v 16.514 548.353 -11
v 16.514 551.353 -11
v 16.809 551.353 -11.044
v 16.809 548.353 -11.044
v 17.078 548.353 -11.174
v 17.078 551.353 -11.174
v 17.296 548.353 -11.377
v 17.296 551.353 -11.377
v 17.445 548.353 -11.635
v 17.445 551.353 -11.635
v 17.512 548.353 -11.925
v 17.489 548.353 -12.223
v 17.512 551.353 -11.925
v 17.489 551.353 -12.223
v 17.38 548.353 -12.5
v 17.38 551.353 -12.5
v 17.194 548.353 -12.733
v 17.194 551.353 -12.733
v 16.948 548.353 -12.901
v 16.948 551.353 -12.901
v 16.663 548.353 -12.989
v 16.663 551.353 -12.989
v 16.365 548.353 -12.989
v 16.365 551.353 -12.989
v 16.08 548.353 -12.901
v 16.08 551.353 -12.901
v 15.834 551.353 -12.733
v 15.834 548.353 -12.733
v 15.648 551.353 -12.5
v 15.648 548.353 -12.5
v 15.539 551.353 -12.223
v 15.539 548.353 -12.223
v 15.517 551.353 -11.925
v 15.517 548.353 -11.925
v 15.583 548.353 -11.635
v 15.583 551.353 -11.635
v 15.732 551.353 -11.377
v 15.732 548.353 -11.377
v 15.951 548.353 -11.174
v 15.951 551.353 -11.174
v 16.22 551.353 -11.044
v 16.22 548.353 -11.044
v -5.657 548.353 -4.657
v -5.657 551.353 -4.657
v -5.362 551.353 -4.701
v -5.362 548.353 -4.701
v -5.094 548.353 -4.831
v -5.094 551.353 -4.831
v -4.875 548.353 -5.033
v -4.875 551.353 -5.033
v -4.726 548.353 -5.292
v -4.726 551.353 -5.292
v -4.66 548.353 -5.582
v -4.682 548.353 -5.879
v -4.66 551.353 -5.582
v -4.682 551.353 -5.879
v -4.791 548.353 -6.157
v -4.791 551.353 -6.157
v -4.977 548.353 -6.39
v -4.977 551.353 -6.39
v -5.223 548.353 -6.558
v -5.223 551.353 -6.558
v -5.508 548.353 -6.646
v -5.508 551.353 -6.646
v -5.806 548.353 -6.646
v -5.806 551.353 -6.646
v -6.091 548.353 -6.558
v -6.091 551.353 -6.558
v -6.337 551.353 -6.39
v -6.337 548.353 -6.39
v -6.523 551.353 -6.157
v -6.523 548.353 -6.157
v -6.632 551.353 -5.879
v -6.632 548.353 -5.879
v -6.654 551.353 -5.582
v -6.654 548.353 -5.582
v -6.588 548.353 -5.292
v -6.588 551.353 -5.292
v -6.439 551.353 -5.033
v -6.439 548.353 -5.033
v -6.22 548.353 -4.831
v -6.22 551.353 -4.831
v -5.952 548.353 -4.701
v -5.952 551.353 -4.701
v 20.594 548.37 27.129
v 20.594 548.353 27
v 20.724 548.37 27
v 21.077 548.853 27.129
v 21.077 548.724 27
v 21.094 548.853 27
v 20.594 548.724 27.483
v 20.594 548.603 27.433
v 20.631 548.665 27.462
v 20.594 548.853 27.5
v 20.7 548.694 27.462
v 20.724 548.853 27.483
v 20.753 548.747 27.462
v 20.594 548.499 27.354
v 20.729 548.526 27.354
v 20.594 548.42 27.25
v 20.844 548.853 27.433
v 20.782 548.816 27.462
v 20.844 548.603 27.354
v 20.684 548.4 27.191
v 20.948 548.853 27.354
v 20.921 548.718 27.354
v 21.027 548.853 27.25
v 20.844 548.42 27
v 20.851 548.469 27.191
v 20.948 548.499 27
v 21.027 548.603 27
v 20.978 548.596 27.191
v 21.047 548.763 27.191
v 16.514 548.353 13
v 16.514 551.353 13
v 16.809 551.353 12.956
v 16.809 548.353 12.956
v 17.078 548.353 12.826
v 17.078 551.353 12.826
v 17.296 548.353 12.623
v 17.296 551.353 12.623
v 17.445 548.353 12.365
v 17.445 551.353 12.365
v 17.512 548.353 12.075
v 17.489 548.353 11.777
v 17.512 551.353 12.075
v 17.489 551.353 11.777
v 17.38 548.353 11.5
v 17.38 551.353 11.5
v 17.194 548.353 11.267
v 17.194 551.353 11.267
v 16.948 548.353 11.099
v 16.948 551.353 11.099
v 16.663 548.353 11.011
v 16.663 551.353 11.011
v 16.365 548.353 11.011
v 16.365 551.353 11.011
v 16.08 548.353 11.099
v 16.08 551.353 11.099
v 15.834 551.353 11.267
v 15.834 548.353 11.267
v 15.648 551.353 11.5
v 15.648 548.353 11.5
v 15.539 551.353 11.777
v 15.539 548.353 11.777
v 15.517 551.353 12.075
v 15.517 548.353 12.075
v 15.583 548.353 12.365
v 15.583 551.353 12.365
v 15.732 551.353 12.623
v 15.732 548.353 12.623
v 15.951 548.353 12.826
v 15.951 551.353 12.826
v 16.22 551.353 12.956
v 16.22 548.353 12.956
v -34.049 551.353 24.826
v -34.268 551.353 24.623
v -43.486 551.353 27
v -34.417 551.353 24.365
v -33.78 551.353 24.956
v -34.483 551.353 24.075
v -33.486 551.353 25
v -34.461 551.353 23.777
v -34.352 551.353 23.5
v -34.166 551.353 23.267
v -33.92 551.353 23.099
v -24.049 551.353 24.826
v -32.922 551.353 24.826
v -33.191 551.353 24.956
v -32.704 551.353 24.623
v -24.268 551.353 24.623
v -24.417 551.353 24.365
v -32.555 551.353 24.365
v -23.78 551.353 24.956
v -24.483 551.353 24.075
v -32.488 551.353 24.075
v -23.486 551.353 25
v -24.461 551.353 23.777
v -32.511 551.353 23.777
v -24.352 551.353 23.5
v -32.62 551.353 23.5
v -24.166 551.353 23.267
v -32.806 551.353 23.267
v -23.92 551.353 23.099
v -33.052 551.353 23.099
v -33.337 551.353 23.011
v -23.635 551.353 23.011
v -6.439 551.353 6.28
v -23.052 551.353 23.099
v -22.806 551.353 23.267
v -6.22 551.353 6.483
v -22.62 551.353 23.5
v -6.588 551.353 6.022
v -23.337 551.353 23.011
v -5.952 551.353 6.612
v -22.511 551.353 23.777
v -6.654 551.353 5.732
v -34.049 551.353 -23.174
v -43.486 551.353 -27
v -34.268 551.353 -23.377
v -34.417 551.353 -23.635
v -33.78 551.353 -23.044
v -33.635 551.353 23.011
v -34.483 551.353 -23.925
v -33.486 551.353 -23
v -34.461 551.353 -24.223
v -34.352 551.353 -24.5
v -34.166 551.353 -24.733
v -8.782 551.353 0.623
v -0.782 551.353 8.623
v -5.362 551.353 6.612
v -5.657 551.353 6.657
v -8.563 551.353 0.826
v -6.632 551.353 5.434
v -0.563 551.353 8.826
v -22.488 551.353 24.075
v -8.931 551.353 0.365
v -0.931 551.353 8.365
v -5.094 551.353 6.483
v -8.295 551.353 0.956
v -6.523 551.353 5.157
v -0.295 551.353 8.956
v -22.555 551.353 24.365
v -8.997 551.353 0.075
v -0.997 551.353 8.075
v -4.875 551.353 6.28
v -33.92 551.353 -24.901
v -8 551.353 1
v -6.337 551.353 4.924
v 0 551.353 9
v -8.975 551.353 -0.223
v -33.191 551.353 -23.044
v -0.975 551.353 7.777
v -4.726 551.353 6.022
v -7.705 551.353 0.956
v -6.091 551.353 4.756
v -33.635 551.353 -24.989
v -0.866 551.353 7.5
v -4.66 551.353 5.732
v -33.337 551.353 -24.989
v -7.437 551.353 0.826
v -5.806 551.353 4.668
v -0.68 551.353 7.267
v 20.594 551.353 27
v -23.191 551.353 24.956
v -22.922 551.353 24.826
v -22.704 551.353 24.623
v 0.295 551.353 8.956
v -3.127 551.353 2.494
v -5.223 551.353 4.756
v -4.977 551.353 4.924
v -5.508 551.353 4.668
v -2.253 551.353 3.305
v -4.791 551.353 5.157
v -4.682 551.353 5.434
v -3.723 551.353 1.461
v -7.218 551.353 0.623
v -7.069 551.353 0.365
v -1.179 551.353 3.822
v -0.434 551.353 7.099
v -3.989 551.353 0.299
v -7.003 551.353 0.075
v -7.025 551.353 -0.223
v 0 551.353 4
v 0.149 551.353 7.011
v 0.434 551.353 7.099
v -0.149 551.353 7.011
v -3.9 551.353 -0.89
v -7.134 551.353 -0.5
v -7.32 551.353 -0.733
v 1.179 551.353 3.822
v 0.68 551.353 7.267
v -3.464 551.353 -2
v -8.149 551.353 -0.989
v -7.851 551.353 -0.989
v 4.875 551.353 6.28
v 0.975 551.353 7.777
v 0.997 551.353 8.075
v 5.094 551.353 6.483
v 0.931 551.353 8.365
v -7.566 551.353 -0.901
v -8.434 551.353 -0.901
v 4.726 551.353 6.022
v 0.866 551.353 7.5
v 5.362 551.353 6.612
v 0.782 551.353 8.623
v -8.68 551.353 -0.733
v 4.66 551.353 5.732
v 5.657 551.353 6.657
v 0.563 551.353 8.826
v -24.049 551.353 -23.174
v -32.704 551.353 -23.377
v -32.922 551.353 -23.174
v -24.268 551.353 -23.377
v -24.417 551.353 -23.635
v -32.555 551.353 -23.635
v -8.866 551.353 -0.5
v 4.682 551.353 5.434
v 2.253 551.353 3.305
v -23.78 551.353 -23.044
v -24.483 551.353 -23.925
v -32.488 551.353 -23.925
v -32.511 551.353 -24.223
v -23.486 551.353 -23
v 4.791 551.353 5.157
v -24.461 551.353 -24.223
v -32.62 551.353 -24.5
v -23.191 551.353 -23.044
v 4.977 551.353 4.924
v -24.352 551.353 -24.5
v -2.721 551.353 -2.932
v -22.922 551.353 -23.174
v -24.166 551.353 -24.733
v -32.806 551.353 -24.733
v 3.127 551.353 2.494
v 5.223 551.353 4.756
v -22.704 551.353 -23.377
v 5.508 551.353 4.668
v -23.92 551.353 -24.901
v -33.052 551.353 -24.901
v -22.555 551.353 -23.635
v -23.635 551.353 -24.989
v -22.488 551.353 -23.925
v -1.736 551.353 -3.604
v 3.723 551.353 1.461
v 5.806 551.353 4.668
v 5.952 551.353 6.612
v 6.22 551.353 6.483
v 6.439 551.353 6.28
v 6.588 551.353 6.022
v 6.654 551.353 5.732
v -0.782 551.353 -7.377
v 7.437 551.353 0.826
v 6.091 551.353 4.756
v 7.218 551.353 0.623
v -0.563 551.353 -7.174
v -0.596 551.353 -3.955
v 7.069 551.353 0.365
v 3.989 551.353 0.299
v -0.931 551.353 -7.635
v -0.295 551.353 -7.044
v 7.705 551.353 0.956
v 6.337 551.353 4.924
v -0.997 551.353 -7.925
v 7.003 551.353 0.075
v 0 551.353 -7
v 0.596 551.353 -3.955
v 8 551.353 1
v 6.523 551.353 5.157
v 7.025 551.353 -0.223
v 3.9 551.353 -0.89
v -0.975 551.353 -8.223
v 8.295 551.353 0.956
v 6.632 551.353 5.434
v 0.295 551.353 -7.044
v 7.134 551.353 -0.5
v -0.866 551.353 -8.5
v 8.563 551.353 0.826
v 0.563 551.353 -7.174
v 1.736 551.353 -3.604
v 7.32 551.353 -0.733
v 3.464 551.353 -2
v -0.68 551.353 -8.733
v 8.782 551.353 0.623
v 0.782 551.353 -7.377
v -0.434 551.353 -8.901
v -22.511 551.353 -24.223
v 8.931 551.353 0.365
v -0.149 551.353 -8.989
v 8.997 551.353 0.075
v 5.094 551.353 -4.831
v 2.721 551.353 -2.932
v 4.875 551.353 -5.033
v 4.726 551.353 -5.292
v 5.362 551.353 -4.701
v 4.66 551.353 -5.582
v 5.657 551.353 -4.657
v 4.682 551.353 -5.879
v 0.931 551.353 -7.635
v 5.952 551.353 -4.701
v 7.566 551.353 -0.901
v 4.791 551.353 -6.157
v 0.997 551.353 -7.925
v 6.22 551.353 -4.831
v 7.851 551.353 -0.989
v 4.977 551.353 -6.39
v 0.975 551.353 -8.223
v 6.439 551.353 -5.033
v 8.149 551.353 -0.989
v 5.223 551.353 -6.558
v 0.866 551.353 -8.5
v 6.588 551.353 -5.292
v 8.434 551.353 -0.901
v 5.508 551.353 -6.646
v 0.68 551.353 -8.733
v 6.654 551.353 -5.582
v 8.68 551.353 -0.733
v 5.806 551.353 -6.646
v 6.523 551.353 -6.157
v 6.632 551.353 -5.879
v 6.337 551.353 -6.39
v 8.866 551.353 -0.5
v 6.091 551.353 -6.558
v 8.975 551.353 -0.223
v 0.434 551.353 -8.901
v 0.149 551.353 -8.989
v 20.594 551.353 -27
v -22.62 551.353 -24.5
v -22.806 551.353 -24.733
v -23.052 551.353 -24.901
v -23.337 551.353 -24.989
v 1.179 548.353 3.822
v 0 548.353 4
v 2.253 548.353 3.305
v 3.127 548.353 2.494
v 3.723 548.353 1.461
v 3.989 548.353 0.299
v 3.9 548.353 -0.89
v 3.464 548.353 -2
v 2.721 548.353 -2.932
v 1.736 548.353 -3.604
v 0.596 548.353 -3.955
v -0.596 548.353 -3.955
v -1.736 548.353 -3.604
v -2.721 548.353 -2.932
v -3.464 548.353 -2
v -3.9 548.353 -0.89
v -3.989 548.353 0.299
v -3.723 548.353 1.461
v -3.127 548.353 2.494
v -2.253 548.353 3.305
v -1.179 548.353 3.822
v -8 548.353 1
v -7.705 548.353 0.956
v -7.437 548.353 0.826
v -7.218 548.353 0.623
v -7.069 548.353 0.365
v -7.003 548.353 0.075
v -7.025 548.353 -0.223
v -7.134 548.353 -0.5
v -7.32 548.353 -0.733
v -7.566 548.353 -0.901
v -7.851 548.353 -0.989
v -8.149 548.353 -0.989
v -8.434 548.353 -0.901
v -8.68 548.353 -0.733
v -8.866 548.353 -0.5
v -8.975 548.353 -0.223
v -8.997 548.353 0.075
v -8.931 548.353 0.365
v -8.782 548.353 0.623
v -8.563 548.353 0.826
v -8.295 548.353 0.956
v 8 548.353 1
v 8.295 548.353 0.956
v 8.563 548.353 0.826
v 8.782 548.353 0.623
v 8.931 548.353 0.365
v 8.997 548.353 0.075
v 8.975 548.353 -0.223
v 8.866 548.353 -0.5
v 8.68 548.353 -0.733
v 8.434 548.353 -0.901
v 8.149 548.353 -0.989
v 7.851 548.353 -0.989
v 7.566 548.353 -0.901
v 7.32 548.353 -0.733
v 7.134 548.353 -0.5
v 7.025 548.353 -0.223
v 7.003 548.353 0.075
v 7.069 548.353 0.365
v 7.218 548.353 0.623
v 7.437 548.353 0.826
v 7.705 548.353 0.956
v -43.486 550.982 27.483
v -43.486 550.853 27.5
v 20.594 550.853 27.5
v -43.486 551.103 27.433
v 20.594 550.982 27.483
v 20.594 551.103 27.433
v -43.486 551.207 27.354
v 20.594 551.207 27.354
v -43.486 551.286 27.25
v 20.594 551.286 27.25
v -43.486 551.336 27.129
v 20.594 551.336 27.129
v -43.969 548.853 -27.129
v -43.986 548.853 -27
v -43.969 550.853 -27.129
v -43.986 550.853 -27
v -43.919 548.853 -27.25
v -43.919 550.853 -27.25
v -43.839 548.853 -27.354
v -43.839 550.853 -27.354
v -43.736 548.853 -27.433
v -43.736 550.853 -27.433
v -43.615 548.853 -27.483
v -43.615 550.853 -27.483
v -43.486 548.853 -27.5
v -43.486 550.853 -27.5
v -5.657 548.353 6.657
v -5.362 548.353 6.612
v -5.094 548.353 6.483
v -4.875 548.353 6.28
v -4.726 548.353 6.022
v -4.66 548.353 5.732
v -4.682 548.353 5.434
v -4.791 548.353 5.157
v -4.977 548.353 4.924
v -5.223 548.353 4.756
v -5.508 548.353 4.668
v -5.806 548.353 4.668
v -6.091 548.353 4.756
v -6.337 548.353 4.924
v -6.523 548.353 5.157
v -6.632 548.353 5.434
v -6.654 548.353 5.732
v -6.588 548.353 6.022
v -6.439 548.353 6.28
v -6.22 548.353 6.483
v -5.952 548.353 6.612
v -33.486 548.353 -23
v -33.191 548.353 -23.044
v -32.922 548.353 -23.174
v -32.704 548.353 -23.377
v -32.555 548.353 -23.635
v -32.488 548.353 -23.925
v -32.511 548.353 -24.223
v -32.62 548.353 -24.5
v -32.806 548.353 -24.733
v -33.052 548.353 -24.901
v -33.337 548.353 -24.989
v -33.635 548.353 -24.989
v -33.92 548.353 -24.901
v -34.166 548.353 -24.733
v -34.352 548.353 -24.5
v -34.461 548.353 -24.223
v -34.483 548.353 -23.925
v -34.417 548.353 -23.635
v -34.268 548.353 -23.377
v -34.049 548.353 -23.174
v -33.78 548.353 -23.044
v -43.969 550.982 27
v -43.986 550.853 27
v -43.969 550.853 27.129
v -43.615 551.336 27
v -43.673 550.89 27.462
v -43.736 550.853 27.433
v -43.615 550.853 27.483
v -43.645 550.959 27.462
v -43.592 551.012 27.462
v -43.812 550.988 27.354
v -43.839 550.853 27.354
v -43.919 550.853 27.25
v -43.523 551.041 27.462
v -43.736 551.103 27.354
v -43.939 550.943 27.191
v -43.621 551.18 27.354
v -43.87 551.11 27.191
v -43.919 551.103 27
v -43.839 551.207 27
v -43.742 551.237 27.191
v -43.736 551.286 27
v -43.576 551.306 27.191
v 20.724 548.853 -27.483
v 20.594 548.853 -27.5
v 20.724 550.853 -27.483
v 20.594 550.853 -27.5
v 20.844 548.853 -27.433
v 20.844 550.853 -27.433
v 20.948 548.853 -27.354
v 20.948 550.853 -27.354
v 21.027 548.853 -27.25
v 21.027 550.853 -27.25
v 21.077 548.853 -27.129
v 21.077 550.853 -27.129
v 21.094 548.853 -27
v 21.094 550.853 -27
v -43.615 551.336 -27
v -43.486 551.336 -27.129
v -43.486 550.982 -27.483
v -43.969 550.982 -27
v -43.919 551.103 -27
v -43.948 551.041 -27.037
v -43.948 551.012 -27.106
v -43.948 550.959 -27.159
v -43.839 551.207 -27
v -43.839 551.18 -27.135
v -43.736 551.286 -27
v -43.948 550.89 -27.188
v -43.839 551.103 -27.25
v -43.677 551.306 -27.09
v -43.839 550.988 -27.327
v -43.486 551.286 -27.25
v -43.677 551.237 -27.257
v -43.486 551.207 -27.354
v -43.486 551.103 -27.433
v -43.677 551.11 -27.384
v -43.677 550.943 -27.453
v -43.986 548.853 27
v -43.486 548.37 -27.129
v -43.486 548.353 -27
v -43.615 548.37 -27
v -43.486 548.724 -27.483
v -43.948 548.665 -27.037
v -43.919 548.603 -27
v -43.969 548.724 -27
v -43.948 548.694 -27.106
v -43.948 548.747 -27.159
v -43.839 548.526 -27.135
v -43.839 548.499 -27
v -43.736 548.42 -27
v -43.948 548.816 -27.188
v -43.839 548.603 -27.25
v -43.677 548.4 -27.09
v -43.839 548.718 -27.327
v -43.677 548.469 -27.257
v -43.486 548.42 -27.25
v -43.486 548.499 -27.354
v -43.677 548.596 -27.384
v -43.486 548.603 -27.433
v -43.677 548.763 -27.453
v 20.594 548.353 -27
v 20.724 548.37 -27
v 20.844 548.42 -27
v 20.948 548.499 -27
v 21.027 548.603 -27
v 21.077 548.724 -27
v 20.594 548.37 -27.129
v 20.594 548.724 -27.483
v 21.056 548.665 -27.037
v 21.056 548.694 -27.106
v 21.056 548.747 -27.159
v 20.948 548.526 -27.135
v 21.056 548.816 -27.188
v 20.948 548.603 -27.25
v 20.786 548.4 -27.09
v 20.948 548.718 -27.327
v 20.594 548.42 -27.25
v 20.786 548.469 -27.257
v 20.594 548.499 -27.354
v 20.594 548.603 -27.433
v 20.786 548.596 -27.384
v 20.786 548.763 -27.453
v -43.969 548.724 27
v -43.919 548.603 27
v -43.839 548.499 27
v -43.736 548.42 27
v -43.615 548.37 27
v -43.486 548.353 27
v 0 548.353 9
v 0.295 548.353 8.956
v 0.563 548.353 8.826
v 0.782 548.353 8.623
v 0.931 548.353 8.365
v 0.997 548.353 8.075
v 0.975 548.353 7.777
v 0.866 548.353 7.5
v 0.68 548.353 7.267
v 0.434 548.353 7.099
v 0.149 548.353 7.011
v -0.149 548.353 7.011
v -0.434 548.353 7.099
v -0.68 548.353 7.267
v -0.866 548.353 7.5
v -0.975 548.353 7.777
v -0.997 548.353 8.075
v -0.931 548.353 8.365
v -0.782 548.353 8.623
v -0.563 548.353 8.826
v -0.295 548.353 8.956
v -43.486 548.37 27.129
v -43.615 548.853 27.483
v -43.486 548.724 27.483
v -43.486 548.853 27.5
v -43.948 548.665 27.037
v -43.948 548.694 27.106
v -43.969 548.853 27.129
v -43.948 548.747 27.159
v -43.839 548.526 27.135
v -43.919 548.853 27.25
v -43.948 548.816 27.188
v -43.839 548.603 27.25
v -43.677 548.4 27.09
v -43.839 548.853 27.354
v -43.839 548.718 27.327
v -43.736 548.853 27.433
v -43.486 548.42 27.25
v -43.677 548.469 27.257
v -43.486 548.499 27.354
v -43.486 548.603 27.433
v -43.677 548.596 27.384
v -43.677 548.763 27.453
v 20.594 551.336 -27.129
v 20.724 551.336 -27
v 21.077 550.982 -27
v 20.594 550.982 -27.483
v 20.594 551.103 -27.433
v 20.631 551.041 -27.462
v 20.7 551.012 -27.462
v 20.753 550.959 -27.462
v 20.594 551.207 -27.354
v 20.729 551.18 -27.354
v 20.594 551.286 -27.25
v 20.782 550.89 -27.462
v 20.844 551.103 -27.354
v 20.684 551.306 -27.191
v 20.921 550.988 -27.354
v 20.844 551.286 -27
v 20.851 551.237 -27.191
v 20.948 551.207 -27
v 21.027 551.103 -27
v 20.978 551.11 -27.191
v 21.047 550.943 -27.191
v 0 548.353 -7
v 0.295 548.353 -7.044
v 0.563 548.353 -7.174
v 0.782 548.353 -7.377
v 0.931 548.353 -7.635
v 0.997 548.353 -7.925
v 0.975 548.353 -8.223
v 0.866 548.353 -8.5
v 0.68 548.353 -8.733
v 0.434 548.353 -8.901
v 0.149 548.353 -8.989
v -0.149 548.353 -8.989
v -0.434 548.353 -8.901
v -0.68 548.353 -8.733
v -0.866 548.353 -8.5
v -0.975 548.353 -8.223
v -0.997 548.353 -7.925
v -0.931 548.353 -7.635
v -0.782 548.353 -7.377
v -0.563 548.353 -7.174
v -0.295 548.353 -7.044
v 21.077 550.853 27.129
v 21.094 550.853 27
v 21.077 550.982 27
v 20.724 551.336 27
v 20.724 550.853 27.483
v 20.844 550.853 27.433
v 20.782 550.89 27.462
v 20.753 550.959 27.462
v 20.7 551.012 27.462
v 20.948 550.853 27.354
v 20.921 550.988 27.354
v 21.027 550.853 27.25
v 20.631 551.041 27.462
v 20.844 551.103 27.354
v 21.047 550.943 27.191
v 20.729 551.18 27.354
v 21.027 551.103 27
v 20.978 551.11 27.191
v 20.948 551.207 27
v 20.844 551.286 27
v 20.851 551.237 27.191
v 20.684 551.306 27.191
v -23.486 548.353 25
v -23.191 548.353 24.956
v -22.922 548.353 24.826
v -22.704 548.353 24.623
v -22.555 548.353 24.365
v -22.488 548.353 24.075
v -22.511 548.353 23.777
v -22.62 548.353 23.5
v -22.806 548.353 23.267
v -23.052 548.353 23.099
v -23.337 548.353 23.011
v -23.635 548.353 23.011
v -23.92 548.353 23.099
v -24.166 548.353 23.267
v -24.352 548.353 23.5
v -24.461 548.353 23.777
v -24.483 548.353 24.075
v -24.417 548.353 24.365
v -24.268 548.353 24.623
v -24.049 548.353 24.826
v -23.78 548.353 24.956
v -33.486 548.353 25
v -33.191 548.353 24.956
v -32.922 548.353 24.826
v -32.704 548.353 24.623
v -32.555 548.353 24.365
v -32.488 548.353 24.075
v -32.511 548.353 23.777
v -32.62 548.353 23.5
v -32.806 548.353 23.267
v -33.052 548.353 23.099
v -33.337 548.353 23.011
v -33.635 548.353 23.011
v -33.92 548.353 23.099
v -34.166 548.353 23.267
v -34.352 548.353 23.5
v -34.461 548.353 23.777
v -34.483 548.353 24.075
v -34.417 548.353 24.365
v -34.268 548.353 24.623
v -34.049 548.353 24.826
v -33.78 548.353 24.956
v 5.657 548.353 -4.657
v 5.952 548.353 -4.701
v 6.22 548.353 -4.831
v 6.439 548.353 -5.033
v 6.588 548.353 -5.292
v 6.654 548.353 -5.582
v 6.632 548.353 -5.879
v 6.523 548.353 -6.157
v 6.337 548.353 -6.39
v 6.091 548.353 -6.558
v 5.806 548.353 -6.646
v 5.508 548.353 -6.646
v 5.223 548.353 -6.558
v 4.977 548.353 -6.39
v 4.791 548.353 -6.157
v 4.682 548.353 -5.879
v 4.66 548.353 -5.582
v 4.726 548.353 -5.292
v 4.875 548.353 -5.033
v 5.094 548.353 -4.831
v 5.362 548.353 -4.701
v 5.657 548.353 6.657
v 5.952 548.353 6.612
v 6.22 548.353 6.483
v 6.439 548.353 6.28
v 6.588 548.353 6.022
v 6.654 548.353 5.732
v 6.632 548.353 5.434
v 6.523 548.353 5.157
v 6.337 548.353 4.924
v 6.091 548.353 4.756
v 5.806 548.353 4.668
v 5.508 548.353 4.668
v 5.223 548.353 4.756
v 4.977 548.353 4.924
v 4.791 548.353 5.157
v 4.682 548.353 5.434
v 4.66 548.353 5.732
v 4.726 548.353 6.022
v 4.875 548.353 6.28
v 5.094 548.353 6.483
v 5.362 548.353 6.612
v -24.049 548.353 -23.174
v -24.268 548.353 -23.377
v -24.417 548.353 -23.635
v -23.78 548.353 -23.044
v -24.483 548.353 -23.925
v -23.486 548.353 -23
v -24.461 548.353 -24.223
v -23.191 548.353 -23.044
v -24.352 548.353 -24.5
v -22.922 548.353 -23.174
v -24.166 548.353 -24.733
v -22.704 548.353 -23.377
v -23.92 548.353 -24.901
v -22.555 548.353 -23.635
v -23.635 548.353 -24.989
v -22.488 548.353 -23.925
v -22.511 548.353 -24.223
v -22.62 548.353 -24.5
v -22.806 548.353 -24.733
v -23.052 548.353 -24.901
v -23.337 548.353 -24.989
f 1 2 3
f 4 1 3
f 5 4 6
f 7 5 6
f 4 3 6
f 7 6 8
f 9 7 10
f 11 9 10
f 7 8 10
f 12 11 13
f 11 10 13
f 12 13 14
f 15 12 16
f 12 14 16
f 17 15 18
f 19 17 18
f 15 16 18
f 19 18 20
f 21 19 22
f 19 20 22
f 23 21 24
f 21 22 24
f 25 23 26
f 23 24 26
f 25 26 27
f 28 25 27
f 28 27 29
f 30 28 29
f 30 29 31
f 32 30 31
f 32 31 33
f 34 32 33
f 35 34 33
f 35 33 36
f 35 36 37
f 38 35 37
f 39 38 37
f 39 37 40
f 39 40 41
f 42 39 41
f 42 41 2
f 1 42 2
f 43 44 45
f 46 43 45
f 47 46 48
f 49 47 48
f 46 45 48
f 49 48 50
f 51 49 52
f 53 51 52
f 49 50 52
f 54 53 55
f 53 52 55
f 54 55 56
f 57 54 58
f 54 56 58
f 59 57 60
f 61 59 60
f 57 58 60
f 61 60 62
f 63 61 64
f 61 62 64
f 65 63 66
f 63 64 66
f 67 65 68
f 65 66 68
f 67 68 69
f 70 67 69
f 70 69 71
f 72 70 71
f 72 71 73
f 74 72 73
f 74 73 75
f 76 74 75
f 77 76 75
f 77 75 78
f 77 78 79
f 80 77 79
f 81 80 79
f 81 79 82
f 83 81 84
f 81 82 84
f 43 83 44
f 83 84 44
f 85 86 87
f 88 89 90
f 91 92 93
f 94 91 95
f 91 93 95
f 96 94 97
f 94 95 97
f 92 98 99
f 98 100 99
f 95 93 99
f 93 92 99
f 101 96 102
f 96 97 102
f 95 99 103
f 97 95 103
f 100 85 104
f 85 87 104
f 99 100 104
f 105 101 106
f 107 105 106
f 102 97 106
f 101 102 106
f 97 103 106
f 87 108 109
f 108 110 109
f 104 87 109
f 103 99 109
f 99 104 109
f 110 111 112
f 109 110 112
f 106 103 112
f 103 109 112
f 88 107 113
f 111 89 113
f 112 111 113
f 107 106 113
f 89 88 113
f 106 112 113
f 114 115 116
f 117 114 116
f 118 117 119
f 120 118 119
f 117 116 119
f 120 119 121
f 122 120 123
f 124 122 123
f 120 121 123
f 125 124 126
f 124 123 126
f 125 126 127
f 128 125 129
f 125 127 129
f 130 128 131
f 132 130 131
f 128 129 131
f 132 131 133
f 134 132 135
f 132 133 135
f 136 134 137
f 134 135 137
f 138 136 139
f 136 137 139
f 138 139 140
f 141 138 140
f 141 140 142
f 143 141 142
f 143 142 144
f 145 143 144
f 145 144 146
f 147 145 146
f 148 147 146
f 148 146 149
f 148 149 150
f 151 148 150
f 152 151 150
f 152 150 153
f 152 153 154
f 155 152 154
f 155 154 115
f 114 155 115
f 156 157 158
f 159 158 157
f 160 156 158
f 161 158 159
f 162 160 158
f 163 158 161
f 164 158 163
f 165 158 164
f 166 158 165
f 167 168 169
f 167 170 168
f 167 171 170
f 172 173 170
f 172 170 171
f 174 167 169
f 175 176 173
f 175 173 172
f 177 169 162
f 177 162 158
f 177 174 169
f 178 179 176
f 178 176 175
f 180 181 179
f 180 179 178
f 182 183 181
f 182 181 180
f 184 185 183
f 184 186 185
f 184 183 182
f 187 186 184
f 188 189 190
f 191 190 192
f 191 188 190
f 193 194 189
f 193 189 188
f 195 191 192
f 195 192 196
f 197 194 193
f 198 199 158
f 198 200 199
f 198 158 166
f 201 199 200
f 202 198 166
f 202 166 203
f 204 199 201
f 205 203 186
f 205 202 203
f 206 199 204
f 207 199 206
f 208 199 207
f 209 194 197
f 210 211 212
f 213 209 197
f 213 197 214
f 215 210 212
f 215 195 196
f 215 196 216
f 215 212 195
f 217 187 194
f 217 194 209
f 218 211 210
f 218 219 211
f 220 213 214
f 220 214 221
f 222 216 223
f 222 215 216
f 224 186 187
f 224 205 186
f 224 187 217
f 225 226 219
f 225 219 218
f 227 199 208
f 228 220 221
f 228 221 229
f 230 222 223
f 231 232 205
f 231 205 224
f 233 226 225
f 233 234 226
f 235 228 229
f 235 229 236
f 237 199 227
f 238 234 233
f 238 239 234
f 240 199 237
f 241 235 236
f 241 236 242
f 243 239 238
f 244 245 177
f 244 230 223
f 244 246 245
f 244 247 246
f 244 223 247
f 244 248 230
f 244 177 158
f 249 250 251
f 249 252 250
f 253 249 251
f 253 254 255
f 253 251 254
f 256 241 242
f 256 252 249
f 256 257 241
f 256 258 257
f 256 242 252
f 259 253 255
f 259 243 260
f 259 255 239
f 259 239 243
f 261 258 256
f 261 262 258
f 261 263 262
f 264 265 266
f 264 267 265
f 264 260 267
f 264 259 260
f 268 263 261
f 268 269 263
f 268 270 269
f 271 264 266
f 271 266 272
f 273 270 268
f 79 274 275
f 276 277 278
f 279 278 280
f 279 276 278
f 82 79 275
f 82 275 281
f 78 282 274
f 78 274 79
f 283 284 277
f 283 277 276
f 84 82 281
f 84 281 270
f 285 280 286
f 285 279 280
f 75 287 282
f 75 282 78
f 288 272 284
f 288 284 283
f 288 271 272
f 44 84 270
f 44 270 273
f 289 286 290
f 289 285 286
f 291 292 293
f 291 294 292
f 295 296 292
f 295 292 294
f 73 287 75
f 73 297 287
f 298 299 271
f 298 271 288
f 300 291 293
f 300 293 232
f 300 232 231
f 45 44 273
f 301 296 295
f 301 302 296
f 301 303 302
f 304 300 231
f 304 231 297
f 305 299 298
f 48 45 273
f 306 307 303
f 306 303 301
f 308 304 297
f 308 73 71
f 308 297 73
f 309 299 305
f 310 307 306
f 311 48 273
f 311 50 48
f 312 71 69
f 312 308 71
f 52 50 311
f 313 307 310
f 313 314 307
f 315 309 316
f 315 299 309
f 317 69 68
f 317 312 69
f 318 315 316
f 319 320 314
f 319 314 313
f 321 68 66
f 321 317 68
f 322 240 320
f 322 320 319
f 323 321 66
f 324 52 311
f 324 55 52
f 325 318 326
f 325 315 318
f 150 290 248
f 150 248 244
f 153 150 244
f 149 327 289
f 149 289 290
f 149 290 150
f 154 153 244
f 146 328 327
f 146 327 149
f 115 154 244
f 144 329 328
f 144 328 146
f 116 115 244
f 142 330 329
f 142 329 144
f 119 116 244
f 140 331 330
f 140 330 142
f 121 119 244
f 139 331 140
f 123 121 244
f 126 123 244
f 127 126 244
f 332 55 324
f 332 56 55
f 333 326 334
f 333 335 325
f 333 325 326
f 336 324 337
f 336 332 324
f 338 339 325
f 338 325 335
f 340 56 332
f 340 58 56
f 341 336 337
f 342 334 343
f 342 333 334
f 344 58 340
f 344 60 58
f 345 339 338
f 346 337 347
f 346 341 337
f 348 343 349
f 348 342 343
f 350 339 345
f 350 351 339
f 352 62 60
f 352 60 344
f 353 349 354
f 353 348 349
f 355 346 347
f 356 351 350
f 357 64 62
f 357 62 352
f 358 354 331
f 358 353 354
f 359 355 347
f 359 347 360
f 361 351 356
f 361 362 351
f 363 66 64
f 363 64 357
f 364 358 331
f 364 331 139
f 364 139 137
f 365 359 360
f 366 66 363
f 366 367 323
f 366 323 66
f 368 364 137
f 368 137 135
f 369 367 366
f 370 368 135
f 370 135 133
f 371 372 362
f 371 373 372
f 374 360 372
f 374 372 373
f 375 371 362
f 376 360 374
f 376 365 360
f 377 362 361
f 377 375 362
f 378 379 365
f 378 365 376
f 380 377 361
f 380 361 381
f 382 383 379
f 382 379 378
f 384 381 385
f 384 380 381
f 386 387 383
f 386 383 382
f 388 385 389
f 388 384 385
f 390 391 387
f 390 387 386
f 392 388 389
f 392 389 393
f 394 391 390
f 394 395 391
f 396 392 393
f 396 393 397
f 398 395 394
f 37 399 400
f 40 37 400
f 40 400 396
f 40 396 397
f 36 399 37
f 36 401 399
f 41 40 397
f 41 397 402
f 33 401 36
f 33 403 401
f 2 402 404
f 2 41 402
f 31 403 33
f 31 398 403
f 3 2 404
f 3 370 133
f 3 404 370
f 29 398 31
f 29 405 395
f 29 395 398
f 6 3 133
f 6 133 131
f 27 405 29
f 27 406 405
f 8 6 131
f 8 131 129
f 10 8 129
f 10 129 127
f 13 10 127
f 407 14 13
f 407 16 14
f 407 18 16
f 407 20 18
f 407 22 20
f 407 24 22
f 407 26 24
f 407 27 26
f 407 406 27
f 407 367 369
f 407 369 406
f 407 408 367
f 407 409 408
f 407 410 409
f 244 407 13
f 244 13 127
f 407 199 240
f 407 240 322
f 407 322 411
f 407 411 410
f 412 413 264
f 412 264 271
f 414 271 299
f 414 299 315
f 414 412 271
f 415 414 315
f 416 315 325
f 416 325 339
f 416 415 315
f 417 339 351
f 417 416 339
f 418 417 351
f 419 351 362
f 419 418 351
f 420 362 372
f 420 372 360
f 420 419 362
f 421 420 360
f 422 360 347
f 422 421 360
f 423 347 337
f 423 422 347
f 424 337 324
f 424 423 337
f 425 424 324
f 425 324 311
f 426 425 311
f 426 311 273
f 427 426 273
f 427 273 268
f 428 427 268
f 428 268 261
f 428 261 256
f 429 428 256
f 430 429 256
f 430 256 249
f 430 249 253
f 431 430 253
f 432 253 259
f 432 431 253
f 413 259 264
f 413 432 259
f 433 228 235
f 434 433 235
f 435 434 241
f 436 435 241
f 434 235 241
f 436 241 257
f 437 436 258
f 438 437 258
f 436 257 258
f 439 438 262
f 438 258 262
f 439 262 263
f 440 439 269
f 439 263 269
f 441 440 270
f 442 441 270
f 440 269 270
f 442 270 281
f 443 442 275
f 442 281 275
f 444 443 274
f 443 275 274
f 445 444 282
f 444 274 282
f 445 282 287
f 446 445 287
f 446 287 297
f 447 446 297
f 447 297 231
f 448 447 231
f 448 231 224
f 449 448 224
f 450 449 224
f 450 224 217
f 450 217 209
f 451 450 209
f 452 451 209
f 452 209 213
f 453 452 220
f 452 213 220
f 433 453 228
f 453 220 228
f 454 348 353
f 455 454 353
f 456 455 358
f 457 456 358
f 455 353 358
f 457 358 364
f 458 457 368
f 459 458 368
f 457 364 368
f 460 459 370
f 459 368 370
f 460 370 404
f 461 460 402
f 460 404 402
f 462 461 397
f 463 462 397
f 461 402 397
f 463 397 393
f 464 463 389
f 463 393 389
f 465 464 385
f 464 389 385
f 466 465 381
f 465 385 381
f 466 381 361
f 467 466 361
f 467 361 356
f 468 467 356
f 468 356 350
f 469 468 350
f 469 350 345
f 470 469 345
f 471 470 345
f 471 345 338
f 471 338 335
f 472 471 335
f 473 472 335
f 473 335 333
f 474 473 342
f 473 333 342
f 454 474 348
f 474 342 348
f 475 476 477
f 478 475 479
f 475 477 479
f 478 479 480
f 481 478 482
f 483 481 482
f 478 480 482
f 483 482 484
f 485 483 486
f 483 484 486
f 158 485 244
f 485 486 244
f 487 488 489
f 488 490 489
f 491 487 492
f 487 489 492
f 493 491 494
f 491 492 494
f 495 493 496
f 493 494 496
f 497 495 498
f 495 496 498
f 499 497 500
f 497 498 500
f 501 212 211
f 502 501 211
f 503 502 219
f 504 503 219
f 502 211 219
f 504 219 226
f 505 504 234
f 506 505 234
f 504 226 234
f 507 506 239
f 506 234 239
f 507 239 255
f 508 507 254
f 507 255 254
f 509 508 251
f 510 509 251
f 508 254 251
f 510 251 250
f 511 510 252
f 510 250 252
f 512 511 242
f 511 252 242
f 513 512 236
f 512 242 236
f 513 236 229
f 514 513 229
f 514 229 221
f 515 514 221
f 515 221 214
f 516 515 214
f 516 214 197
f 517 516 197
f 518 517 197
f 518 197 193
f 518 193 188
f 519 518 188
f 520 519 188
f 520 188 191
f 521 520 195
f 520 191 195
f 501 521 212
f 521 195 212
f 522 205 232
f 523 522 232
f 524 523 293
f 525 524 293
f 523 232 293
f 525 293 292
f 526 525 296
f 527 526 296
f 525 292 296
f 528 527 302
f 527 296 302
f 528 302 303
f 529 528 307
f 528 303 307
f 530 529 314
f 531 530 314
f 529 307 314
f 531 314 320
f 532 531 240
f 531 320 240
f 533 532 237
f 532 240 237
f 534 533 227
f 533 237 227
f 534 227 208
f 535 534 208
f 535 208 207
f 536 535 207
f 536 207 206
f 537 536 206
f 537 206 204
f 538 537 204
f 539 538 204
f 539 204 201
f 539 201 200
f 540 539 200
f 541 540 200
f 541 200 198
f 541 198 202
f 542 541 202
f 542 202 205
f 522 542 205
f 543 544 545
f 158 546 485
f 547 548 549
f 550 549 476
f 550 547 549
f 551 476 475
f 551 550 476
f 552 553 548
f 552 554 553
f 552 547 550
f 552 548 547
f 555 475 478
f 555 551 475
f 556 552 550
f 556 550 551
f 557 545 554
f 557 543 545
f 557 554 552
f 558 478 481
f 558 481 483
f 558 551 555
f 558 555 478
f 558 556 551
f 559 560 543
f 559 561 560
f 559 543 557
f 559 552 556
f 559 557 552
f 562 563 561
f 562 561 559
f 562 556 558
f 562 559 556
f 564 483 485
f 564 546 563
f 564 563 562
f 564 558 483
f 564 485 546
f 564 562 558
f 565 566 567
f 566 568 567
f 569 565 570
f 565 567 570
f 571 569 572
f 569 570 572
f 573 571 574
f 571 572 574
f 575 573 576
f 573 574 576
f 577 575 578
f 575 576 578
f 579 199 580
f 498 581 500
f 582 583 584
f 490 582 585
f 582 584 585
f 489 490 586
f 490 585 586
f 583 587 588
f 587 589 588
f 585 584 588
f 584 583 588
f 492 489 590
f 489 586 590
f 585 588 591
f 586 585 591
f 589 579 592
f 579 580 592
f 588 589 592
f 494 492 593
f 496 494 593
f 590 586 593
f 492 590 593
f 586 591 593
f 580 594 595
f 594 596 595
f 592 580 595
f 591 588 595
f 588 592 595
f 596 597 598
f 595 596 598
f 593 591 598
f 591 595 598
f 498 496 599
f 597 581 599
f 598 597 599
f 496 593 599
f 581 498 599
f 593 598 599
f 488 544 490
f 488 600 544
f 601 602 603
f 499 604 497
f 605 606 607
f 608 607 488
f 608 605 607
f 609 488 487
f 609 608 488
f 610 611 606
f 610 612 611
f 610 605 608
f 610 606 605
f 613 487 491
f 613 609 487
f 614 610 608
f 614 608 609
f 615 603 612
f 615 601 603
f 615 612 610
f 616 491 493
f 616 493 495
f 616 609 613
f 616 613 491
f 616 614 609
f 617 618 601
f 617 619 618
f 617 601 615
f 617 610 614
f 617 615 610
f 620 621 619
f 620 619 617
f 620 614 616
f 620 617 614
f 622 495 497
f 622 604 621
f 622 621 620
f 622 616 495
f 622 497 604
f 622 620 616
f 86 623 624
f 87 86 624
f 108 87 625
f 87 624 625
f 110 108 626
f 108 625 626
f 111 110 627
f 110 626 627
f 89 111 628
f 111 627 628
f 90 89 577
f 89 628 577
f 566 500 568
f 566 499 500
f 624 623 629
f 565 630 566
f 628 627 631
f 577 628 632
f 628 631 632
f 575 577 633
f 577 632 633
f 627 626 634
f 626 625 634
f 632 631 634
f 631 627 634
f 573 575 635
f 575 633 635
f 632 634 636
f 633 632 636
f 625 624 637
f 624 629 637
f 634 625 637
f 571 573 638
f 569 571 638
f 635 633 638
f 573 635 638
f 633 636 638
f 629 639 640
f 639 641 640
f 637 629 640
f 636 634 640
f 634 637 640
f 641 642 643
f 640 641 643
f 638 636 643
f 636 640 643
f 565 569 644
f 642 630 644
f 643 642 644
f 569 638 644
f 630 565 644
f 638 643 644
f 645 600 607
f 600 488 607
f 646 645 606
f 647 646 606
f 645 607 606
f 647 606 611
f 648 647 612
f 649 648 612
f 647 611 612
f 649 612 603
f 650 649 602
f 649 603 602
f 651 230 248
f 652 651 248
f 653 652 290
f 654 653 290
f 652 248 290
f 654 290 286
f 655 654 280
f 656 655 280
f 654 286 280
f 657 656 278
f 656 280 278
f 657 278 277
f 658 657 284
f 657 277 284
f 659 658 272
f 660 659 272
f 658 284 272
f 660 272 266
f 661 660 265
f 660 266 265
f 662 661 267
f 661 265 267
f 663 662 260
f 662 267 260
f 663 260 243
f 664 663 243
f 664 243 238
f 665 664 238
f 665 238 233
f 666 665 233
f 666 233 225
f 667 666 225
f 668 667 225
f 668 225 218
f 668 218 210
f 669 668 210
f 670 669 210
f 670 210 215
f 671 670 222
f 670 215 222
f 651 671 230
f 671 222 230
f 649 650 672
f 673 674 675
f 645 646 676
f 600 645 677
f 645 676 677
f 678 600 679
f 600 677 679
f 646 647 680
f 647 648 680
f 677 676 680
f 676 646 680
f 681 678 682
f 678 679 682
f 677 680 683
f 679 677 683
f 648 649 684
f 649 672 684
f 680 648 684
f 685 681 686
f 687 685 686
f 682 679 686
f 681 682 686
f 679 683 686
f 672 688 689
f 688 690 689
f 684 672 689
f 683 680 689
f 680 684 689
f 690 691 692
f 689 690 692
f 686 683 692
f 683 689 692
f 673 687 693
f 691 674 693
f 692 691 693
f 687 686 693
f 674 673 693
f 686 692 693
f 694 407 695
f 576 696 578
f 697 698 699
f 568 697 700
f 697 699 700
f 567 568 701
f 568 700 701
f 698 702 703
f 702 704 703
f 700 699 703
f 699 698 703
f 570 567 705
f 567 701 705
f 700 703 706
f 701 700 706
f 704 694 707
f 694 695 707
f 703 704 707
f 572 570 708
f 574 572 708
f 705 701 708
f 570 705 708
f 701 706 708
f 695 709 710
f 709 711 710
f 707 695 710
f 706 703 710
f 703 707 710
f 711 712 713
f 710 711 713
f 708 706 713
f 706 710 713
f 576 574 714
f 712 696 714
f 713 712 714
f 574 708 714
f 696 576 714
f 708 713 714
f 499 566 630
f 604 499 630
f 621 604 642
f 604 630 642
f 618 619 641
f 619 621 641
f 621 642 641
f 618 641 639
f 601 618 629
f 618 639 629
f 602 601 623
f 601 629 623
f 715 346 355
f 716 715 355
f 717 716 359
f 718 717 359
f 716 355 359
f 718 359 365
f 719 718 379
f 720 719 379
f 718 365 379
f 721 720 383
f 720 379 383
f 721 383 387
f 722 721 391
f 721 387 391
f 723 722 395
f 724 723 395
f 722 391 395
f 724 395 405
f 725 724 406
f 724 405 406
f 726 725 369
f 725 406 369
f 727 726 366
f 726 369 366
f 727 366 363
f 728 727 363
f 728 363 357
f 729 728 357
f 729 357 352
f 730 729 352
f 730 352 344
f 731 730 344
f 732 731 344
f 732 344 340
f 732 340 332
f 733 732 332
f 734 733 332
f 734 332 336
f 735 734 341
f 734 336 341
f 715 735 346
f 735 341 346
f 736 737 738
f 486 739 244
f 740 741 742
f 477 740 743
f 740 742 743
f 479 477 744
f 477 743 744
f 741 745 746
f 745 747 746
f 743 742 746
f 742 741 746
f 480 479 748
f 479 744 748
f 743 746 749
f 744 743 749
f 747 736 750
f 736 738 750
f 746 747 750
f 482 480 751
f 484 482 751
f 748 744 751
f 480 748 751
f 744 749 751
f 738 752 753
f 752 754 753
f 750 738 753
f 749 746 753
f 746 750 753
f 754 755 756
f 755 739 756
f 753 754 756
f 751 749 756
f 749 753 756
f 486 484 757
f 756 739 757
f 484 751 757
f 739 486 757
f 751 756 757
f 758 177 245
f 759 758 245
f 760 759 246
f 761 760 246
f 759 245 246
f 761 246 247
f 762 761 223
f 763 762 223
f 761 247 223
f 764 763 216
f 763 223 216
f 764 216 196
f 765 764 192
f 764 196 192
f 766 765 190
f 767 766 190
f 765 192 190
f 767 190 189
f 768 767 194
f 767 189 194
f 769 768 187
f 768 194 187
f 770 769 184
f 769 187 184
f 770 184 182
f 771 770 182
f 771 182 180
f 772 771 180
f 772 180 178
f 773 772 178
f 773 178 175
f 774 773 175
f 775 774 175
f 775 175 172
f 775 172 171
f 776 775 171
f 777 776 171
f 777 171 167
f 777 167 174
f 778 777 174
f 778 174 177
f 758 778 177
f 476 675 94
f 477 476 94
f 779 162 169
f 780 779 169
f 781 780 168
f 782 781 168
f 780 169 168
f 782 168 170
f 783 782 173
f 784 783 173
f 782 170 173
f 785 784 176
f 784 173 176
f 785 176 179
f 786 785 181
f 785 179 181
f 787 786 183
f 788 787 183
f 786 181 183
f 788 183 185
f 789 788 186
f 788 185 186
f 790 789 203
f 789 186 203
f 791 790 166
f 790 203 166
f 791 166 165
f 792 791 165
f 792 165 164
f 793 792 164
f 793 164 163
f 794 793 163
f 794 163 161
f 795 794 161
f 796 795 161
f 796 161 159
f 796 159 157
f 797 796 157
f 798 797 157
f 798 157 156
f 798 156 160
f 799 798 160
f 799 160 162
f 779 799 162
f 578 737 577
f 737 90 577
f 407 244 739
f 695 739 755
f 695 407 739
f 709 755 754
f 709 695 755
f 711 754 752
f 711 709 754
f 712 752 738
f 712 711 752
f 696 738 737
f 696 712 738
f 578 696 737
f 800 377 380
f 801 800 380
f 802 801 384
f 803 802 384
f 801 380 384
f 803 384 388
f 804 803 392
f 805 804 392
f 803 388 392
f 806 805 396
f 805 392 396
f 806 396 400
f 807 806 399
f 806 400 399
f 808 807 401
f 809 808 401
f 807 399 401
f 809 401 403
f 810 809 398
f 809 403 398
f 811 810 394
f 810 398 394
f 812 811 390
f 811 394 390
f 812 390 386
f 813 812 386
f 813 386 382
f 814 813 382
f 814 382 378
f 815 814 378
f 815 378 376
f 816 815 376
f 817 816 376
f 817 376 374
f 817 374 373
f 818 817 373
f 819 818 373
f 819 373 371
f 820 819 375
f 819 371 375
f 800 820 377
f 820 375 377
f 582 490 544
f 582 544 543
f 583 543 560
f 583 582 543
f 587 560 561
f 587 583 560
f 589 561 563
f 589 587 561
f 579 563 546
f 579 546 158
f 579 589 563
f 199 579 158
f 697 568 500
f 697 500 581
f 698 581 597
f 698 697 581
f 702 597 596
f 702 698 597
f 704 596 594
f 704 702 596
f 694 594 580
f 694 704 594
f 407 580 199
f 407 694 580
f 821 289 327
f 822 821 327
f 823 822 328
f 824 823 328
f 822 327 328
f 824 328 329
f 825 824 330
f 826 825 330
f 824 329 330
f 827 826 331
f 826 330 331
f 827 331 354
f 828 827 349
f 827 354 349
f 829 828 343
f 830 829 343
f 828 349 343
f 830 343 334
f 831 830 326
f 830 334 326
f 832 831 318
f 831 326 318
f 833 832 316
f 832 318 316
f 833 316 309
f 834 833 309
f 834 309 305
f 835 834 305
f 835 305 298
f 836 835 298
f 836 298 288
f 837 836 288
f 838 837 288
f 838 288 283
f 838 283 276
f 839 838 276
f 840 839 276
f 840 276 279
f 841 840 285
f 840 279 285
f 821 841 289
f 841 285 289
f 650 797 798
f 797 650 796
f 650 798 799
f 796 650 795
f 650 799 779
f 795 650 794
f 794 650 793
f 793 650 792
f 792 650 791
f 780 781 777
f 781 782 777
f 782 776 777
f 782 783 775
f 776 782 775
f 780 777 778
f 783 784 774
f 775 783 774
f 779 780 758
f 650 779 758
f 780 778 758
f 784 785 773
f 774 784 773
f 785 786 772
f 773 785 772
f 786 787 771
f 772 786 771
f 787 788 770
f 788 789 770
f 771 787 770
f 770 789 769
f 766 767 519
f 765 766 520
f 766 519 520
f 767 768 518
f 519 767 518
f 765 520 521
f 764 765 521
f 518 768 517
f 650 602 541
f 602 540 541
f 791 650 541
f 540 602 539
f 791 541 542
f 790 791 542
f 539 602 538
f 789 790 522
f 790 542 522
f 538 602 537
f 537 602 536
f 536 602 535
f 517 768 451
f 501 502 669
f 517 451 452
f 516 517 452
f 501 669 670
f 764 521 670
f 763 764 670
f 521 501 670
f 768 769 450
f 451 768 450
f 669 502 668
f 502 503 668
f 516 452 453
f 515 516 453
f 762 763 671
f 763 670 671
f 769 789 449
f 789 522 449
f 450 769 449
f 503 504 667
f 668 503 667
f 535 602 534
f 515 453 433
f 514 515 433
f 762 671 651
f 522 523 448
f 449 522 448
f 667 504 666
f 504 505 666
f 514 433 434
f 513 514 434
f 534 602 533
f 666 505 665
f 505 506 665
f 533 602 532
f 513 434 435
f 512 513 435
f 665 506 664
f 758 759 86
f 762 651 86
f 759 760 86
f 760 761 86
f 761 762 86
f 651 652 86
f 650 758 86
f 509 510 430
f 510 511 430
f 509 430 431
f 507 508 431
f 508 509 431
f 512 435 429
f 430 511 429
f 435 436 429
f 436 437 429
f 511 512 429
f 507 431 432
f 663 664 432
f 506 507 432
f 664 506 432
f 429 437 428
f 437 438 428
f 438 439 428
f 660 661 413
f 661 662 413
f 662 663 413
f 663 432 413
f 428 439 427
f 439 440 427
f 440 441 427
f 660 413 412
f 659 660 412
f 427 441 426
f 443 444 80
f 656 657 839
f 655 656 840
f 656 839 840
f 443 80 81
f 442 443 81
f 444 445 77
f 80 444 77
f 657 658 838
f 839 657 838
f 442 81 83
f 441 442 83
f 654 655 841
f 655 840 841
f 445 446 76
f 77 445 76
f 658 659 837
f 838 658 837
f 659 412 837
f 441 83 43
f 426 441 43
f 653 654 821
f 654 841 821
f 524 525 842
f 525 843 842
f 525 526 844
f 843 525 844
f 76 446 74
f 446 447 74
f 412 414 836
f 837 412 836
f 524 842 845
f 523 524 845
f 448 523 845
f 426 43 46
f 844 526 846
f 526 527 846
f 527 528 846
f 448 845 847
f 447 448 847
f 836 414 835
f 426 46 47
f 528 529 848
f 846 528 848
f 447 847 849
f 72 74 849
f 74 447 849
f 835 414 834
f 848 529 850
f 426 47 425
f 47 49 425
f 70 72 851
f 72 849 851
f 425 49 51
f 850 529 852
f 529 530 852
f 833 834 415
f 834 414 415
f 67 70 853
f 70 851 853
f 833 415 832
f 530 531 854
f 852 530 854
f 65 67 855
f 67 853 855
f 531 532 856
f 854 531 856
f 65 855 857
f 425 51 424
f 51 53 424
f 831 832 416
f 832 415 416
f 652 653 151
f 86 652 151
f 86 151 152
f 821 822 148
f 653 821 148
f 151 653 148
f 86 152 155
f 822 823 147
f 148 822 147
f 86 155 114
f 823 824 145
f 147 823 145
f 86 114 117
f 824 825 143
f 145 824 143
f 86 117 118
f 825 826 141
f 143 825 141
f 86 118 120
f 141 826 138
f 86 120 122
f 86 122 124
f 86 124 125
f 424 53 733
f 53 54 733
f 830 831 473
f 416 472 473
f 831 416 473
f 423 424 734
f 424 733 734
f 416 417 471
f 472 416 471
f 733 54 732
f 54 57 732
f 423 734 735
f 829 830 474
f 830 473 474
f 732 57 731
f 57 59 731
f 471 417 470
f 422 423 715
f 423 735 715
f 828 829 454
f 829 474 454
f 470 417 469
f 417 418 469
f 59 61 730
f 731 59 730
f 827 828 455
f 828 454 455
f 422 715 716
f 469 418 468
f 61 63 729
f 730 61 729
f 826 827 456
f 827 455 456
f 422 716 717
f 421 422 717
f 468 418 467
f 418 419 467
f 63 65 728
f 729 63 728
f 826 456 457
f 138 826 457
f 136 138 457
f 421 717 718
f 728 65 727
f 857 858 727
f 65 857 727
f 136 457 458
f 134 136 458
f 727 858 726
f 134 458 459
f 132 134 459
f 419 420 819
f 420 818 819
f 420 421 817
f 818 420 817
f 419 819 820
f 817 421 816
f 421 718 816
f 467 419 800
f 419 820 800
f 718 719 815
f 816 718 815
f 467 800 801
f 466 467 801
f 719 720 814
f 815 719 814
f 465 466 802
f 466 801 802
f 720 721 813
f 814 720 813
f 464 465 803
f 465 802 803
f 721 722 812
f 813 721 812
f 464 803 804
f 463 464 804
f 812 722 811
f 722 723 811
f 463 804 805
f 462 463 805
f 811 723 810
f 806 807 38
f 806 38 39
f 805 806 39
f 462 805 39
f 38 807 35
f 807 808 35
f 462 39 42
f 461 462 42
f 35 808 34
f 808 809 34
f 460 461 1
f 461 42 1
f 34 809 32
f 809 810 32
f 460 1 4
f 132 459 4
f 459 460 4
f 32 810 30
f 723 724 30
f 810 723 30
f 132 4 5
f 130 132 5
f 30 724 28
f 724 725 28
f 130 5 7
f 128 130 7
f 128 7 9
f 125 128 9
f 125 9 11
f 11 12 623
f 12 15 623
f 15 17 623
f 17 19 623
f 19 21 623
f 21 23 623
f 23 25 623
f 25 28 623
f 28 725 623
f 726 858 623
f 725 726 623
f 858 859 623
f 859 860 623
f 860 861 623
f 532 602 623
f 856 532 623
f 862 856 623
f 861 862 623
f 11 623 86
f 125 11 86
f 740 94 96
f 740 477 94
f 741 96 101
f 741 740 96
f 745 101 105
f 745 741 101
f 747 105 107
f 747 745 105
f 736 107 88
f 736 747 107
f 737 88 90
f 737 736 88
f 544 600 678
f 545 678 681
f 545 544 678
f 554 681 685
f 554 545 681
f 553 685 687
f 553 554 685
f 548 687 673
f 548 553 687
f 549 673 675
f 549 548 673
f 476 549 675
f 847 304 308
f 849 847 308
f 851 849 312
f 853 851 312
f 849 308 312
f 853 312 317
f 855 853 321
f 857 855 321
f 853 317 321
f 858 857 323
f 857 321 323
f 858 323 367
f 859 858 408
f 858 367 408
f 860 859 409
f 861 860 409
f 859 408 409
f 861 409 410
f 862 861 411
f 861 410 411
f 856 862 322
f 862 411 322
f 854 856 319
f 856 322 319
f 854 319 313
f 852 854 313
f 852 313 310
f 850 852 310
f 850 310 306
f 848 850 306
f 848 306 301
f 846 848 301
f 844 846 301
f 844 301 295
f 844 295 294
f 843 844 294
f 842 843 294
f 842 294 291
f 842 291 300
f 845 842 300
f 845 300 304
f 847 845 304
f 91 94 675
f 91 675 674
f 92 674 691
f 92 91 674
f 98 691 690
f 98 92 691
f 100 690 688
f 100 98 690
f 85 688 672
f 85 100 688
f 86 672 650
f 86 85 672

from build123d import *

# Parameters (mm, degrees)
SKETCH1_W           = 65.079845806
SKETCH1_H           = 55
SKETCH1_R           = 4
BOSS_EXTRUDE1_DEPTH = 3
SKETCH2_R           = 1
CUT_EXTRUDE1_DEPTH  = 3
FILLET1_R           = 0.5
SKETCH3_R           = 1
CUT_EXTRUDE2_DEPTH  = 52.961426281


with BuildPart() as part:
    # Sketch1 → Boss-Extrude1 (new body)
    with BuildSketch(Plane(origin=(0, 548.352995908, 0), x_dir=(1, 0, 0), z_dir=(0, 1, 0))):
        with Locations((-11.445754552, 0)):
            Rectangle(SKETCH1_W, SKETCH1_H)
        with Locations(Location((0, 0, 0), (0, 0, 270))):
            Circle(SKETCH1_R, mode=Mode.SUBTRACT)
    extrude(amount=BOSS_EXTRUDE1_DEPTH)

    # Sketch2 → Cut-Extrude1 (cut)
    with BuildSketch(Plane(origin=(0, 551.352995908, 0), x_dir=(1, 0, 0), z_dir=(0, 1, 0))):
        with Locations(Location((0, 8, 0), (0, 0, 270))):
            Circle(SKETCH2_R)
        with Locations(Location((5.656854249, 5.656854249, 0), (0, 0, 270))):
            Circle(SKETCH2_R)
        with Locations(Location((8, 0, 0), (0, 0, 270))):
            Circle(SKETCH2_R)
        with Locations(Location((5.656854249, -5.656854249, 0), (0, 0, 270))):
            Circle(SKETCH2_R)
        with Locations(Location((0, -8, 0), (0, 0, 270))):
            Circle(SKETCH2_R)
        with Locations(Location((-5.656854249, -5.656854249, 0), (0, 0, 270))):
            Circle(SKETCH2_R)
        with Locations(Location((-8, 0, 0), (0, 0, 270))):
            Circle(SKETCH2_R)
        with Locations(Location((-5.656854249, 5.656854249, 0), (0, 0, 270))):
            Circle(SKETCH2_R)
    extrude(amount=-CUT_EXTRUDE1_DEPTH, mode=Mode.SUBTRACT)

    # Fillet1
    fillet1_edges = [part.edges().sort_by_distance(p)[0] for p in [
        (21.094168351, 551.352995908, 0),
        (-11.445754552, 551.352995908, -27.5),
        (-43.985677455, 551.352995908, 0),
        (-11.445754552, 548.352995908, -27.5),
        (21.094168351, 548.352995908, 0),
        (-11.445754552, 548.352995908, 27.5),
        (-43.985677455, 548.352995908, 0),
        (-43.985677455, 549.852995908, -27.5),
        (21.094168351, 549.852995908, -27.5),
        (21.094168351, 549.852995908, 27.5),
        (-43.985677455, 549.852995908, 27.5),
        (-11.445754552, 551.352995908, 27.5),
    ]]
    fillet(fillet1_edges, radius=FILLET1_R)

    # Sketch3 → Cut-Extrude2 (cut, through all)
    with BuildSketch(Plane(origin=(0, 551.352995908, 0), x_dir=(1, 0, 0), z_dir=(0, 1, 0))):
        with Locations(Location((-33.485677455, -24, 0), (0, 0, 270))):
            Circle(SKETCH3_R)
        with Locations(Location((-23.485677455, -24, 0), (0, 0, 270))):
            Circle(SKETCH3_R)
        with Locations(Location((16.514322545, -12, 0), (0, 0, 270))):
            Circle(SKETCH3_R)
        with Locations(Location((16.514322545, 12, 0), (0, 0, 270))):
            Circle(SKETCH3_R)
        with Locations(Location((-23.485677455, 24, 0), (0, 0, 270))):
            Circle(SKETCH3_R)
        with Locations(Location((-33.485677455, 24, 0), (0, 0, 270))):
            Circle(SKETCH3_R)
    extrude(amount=-CUT_EXTRUDE2_DEPTH, mode=Mode.SUBTRACT)


solid = part.part
